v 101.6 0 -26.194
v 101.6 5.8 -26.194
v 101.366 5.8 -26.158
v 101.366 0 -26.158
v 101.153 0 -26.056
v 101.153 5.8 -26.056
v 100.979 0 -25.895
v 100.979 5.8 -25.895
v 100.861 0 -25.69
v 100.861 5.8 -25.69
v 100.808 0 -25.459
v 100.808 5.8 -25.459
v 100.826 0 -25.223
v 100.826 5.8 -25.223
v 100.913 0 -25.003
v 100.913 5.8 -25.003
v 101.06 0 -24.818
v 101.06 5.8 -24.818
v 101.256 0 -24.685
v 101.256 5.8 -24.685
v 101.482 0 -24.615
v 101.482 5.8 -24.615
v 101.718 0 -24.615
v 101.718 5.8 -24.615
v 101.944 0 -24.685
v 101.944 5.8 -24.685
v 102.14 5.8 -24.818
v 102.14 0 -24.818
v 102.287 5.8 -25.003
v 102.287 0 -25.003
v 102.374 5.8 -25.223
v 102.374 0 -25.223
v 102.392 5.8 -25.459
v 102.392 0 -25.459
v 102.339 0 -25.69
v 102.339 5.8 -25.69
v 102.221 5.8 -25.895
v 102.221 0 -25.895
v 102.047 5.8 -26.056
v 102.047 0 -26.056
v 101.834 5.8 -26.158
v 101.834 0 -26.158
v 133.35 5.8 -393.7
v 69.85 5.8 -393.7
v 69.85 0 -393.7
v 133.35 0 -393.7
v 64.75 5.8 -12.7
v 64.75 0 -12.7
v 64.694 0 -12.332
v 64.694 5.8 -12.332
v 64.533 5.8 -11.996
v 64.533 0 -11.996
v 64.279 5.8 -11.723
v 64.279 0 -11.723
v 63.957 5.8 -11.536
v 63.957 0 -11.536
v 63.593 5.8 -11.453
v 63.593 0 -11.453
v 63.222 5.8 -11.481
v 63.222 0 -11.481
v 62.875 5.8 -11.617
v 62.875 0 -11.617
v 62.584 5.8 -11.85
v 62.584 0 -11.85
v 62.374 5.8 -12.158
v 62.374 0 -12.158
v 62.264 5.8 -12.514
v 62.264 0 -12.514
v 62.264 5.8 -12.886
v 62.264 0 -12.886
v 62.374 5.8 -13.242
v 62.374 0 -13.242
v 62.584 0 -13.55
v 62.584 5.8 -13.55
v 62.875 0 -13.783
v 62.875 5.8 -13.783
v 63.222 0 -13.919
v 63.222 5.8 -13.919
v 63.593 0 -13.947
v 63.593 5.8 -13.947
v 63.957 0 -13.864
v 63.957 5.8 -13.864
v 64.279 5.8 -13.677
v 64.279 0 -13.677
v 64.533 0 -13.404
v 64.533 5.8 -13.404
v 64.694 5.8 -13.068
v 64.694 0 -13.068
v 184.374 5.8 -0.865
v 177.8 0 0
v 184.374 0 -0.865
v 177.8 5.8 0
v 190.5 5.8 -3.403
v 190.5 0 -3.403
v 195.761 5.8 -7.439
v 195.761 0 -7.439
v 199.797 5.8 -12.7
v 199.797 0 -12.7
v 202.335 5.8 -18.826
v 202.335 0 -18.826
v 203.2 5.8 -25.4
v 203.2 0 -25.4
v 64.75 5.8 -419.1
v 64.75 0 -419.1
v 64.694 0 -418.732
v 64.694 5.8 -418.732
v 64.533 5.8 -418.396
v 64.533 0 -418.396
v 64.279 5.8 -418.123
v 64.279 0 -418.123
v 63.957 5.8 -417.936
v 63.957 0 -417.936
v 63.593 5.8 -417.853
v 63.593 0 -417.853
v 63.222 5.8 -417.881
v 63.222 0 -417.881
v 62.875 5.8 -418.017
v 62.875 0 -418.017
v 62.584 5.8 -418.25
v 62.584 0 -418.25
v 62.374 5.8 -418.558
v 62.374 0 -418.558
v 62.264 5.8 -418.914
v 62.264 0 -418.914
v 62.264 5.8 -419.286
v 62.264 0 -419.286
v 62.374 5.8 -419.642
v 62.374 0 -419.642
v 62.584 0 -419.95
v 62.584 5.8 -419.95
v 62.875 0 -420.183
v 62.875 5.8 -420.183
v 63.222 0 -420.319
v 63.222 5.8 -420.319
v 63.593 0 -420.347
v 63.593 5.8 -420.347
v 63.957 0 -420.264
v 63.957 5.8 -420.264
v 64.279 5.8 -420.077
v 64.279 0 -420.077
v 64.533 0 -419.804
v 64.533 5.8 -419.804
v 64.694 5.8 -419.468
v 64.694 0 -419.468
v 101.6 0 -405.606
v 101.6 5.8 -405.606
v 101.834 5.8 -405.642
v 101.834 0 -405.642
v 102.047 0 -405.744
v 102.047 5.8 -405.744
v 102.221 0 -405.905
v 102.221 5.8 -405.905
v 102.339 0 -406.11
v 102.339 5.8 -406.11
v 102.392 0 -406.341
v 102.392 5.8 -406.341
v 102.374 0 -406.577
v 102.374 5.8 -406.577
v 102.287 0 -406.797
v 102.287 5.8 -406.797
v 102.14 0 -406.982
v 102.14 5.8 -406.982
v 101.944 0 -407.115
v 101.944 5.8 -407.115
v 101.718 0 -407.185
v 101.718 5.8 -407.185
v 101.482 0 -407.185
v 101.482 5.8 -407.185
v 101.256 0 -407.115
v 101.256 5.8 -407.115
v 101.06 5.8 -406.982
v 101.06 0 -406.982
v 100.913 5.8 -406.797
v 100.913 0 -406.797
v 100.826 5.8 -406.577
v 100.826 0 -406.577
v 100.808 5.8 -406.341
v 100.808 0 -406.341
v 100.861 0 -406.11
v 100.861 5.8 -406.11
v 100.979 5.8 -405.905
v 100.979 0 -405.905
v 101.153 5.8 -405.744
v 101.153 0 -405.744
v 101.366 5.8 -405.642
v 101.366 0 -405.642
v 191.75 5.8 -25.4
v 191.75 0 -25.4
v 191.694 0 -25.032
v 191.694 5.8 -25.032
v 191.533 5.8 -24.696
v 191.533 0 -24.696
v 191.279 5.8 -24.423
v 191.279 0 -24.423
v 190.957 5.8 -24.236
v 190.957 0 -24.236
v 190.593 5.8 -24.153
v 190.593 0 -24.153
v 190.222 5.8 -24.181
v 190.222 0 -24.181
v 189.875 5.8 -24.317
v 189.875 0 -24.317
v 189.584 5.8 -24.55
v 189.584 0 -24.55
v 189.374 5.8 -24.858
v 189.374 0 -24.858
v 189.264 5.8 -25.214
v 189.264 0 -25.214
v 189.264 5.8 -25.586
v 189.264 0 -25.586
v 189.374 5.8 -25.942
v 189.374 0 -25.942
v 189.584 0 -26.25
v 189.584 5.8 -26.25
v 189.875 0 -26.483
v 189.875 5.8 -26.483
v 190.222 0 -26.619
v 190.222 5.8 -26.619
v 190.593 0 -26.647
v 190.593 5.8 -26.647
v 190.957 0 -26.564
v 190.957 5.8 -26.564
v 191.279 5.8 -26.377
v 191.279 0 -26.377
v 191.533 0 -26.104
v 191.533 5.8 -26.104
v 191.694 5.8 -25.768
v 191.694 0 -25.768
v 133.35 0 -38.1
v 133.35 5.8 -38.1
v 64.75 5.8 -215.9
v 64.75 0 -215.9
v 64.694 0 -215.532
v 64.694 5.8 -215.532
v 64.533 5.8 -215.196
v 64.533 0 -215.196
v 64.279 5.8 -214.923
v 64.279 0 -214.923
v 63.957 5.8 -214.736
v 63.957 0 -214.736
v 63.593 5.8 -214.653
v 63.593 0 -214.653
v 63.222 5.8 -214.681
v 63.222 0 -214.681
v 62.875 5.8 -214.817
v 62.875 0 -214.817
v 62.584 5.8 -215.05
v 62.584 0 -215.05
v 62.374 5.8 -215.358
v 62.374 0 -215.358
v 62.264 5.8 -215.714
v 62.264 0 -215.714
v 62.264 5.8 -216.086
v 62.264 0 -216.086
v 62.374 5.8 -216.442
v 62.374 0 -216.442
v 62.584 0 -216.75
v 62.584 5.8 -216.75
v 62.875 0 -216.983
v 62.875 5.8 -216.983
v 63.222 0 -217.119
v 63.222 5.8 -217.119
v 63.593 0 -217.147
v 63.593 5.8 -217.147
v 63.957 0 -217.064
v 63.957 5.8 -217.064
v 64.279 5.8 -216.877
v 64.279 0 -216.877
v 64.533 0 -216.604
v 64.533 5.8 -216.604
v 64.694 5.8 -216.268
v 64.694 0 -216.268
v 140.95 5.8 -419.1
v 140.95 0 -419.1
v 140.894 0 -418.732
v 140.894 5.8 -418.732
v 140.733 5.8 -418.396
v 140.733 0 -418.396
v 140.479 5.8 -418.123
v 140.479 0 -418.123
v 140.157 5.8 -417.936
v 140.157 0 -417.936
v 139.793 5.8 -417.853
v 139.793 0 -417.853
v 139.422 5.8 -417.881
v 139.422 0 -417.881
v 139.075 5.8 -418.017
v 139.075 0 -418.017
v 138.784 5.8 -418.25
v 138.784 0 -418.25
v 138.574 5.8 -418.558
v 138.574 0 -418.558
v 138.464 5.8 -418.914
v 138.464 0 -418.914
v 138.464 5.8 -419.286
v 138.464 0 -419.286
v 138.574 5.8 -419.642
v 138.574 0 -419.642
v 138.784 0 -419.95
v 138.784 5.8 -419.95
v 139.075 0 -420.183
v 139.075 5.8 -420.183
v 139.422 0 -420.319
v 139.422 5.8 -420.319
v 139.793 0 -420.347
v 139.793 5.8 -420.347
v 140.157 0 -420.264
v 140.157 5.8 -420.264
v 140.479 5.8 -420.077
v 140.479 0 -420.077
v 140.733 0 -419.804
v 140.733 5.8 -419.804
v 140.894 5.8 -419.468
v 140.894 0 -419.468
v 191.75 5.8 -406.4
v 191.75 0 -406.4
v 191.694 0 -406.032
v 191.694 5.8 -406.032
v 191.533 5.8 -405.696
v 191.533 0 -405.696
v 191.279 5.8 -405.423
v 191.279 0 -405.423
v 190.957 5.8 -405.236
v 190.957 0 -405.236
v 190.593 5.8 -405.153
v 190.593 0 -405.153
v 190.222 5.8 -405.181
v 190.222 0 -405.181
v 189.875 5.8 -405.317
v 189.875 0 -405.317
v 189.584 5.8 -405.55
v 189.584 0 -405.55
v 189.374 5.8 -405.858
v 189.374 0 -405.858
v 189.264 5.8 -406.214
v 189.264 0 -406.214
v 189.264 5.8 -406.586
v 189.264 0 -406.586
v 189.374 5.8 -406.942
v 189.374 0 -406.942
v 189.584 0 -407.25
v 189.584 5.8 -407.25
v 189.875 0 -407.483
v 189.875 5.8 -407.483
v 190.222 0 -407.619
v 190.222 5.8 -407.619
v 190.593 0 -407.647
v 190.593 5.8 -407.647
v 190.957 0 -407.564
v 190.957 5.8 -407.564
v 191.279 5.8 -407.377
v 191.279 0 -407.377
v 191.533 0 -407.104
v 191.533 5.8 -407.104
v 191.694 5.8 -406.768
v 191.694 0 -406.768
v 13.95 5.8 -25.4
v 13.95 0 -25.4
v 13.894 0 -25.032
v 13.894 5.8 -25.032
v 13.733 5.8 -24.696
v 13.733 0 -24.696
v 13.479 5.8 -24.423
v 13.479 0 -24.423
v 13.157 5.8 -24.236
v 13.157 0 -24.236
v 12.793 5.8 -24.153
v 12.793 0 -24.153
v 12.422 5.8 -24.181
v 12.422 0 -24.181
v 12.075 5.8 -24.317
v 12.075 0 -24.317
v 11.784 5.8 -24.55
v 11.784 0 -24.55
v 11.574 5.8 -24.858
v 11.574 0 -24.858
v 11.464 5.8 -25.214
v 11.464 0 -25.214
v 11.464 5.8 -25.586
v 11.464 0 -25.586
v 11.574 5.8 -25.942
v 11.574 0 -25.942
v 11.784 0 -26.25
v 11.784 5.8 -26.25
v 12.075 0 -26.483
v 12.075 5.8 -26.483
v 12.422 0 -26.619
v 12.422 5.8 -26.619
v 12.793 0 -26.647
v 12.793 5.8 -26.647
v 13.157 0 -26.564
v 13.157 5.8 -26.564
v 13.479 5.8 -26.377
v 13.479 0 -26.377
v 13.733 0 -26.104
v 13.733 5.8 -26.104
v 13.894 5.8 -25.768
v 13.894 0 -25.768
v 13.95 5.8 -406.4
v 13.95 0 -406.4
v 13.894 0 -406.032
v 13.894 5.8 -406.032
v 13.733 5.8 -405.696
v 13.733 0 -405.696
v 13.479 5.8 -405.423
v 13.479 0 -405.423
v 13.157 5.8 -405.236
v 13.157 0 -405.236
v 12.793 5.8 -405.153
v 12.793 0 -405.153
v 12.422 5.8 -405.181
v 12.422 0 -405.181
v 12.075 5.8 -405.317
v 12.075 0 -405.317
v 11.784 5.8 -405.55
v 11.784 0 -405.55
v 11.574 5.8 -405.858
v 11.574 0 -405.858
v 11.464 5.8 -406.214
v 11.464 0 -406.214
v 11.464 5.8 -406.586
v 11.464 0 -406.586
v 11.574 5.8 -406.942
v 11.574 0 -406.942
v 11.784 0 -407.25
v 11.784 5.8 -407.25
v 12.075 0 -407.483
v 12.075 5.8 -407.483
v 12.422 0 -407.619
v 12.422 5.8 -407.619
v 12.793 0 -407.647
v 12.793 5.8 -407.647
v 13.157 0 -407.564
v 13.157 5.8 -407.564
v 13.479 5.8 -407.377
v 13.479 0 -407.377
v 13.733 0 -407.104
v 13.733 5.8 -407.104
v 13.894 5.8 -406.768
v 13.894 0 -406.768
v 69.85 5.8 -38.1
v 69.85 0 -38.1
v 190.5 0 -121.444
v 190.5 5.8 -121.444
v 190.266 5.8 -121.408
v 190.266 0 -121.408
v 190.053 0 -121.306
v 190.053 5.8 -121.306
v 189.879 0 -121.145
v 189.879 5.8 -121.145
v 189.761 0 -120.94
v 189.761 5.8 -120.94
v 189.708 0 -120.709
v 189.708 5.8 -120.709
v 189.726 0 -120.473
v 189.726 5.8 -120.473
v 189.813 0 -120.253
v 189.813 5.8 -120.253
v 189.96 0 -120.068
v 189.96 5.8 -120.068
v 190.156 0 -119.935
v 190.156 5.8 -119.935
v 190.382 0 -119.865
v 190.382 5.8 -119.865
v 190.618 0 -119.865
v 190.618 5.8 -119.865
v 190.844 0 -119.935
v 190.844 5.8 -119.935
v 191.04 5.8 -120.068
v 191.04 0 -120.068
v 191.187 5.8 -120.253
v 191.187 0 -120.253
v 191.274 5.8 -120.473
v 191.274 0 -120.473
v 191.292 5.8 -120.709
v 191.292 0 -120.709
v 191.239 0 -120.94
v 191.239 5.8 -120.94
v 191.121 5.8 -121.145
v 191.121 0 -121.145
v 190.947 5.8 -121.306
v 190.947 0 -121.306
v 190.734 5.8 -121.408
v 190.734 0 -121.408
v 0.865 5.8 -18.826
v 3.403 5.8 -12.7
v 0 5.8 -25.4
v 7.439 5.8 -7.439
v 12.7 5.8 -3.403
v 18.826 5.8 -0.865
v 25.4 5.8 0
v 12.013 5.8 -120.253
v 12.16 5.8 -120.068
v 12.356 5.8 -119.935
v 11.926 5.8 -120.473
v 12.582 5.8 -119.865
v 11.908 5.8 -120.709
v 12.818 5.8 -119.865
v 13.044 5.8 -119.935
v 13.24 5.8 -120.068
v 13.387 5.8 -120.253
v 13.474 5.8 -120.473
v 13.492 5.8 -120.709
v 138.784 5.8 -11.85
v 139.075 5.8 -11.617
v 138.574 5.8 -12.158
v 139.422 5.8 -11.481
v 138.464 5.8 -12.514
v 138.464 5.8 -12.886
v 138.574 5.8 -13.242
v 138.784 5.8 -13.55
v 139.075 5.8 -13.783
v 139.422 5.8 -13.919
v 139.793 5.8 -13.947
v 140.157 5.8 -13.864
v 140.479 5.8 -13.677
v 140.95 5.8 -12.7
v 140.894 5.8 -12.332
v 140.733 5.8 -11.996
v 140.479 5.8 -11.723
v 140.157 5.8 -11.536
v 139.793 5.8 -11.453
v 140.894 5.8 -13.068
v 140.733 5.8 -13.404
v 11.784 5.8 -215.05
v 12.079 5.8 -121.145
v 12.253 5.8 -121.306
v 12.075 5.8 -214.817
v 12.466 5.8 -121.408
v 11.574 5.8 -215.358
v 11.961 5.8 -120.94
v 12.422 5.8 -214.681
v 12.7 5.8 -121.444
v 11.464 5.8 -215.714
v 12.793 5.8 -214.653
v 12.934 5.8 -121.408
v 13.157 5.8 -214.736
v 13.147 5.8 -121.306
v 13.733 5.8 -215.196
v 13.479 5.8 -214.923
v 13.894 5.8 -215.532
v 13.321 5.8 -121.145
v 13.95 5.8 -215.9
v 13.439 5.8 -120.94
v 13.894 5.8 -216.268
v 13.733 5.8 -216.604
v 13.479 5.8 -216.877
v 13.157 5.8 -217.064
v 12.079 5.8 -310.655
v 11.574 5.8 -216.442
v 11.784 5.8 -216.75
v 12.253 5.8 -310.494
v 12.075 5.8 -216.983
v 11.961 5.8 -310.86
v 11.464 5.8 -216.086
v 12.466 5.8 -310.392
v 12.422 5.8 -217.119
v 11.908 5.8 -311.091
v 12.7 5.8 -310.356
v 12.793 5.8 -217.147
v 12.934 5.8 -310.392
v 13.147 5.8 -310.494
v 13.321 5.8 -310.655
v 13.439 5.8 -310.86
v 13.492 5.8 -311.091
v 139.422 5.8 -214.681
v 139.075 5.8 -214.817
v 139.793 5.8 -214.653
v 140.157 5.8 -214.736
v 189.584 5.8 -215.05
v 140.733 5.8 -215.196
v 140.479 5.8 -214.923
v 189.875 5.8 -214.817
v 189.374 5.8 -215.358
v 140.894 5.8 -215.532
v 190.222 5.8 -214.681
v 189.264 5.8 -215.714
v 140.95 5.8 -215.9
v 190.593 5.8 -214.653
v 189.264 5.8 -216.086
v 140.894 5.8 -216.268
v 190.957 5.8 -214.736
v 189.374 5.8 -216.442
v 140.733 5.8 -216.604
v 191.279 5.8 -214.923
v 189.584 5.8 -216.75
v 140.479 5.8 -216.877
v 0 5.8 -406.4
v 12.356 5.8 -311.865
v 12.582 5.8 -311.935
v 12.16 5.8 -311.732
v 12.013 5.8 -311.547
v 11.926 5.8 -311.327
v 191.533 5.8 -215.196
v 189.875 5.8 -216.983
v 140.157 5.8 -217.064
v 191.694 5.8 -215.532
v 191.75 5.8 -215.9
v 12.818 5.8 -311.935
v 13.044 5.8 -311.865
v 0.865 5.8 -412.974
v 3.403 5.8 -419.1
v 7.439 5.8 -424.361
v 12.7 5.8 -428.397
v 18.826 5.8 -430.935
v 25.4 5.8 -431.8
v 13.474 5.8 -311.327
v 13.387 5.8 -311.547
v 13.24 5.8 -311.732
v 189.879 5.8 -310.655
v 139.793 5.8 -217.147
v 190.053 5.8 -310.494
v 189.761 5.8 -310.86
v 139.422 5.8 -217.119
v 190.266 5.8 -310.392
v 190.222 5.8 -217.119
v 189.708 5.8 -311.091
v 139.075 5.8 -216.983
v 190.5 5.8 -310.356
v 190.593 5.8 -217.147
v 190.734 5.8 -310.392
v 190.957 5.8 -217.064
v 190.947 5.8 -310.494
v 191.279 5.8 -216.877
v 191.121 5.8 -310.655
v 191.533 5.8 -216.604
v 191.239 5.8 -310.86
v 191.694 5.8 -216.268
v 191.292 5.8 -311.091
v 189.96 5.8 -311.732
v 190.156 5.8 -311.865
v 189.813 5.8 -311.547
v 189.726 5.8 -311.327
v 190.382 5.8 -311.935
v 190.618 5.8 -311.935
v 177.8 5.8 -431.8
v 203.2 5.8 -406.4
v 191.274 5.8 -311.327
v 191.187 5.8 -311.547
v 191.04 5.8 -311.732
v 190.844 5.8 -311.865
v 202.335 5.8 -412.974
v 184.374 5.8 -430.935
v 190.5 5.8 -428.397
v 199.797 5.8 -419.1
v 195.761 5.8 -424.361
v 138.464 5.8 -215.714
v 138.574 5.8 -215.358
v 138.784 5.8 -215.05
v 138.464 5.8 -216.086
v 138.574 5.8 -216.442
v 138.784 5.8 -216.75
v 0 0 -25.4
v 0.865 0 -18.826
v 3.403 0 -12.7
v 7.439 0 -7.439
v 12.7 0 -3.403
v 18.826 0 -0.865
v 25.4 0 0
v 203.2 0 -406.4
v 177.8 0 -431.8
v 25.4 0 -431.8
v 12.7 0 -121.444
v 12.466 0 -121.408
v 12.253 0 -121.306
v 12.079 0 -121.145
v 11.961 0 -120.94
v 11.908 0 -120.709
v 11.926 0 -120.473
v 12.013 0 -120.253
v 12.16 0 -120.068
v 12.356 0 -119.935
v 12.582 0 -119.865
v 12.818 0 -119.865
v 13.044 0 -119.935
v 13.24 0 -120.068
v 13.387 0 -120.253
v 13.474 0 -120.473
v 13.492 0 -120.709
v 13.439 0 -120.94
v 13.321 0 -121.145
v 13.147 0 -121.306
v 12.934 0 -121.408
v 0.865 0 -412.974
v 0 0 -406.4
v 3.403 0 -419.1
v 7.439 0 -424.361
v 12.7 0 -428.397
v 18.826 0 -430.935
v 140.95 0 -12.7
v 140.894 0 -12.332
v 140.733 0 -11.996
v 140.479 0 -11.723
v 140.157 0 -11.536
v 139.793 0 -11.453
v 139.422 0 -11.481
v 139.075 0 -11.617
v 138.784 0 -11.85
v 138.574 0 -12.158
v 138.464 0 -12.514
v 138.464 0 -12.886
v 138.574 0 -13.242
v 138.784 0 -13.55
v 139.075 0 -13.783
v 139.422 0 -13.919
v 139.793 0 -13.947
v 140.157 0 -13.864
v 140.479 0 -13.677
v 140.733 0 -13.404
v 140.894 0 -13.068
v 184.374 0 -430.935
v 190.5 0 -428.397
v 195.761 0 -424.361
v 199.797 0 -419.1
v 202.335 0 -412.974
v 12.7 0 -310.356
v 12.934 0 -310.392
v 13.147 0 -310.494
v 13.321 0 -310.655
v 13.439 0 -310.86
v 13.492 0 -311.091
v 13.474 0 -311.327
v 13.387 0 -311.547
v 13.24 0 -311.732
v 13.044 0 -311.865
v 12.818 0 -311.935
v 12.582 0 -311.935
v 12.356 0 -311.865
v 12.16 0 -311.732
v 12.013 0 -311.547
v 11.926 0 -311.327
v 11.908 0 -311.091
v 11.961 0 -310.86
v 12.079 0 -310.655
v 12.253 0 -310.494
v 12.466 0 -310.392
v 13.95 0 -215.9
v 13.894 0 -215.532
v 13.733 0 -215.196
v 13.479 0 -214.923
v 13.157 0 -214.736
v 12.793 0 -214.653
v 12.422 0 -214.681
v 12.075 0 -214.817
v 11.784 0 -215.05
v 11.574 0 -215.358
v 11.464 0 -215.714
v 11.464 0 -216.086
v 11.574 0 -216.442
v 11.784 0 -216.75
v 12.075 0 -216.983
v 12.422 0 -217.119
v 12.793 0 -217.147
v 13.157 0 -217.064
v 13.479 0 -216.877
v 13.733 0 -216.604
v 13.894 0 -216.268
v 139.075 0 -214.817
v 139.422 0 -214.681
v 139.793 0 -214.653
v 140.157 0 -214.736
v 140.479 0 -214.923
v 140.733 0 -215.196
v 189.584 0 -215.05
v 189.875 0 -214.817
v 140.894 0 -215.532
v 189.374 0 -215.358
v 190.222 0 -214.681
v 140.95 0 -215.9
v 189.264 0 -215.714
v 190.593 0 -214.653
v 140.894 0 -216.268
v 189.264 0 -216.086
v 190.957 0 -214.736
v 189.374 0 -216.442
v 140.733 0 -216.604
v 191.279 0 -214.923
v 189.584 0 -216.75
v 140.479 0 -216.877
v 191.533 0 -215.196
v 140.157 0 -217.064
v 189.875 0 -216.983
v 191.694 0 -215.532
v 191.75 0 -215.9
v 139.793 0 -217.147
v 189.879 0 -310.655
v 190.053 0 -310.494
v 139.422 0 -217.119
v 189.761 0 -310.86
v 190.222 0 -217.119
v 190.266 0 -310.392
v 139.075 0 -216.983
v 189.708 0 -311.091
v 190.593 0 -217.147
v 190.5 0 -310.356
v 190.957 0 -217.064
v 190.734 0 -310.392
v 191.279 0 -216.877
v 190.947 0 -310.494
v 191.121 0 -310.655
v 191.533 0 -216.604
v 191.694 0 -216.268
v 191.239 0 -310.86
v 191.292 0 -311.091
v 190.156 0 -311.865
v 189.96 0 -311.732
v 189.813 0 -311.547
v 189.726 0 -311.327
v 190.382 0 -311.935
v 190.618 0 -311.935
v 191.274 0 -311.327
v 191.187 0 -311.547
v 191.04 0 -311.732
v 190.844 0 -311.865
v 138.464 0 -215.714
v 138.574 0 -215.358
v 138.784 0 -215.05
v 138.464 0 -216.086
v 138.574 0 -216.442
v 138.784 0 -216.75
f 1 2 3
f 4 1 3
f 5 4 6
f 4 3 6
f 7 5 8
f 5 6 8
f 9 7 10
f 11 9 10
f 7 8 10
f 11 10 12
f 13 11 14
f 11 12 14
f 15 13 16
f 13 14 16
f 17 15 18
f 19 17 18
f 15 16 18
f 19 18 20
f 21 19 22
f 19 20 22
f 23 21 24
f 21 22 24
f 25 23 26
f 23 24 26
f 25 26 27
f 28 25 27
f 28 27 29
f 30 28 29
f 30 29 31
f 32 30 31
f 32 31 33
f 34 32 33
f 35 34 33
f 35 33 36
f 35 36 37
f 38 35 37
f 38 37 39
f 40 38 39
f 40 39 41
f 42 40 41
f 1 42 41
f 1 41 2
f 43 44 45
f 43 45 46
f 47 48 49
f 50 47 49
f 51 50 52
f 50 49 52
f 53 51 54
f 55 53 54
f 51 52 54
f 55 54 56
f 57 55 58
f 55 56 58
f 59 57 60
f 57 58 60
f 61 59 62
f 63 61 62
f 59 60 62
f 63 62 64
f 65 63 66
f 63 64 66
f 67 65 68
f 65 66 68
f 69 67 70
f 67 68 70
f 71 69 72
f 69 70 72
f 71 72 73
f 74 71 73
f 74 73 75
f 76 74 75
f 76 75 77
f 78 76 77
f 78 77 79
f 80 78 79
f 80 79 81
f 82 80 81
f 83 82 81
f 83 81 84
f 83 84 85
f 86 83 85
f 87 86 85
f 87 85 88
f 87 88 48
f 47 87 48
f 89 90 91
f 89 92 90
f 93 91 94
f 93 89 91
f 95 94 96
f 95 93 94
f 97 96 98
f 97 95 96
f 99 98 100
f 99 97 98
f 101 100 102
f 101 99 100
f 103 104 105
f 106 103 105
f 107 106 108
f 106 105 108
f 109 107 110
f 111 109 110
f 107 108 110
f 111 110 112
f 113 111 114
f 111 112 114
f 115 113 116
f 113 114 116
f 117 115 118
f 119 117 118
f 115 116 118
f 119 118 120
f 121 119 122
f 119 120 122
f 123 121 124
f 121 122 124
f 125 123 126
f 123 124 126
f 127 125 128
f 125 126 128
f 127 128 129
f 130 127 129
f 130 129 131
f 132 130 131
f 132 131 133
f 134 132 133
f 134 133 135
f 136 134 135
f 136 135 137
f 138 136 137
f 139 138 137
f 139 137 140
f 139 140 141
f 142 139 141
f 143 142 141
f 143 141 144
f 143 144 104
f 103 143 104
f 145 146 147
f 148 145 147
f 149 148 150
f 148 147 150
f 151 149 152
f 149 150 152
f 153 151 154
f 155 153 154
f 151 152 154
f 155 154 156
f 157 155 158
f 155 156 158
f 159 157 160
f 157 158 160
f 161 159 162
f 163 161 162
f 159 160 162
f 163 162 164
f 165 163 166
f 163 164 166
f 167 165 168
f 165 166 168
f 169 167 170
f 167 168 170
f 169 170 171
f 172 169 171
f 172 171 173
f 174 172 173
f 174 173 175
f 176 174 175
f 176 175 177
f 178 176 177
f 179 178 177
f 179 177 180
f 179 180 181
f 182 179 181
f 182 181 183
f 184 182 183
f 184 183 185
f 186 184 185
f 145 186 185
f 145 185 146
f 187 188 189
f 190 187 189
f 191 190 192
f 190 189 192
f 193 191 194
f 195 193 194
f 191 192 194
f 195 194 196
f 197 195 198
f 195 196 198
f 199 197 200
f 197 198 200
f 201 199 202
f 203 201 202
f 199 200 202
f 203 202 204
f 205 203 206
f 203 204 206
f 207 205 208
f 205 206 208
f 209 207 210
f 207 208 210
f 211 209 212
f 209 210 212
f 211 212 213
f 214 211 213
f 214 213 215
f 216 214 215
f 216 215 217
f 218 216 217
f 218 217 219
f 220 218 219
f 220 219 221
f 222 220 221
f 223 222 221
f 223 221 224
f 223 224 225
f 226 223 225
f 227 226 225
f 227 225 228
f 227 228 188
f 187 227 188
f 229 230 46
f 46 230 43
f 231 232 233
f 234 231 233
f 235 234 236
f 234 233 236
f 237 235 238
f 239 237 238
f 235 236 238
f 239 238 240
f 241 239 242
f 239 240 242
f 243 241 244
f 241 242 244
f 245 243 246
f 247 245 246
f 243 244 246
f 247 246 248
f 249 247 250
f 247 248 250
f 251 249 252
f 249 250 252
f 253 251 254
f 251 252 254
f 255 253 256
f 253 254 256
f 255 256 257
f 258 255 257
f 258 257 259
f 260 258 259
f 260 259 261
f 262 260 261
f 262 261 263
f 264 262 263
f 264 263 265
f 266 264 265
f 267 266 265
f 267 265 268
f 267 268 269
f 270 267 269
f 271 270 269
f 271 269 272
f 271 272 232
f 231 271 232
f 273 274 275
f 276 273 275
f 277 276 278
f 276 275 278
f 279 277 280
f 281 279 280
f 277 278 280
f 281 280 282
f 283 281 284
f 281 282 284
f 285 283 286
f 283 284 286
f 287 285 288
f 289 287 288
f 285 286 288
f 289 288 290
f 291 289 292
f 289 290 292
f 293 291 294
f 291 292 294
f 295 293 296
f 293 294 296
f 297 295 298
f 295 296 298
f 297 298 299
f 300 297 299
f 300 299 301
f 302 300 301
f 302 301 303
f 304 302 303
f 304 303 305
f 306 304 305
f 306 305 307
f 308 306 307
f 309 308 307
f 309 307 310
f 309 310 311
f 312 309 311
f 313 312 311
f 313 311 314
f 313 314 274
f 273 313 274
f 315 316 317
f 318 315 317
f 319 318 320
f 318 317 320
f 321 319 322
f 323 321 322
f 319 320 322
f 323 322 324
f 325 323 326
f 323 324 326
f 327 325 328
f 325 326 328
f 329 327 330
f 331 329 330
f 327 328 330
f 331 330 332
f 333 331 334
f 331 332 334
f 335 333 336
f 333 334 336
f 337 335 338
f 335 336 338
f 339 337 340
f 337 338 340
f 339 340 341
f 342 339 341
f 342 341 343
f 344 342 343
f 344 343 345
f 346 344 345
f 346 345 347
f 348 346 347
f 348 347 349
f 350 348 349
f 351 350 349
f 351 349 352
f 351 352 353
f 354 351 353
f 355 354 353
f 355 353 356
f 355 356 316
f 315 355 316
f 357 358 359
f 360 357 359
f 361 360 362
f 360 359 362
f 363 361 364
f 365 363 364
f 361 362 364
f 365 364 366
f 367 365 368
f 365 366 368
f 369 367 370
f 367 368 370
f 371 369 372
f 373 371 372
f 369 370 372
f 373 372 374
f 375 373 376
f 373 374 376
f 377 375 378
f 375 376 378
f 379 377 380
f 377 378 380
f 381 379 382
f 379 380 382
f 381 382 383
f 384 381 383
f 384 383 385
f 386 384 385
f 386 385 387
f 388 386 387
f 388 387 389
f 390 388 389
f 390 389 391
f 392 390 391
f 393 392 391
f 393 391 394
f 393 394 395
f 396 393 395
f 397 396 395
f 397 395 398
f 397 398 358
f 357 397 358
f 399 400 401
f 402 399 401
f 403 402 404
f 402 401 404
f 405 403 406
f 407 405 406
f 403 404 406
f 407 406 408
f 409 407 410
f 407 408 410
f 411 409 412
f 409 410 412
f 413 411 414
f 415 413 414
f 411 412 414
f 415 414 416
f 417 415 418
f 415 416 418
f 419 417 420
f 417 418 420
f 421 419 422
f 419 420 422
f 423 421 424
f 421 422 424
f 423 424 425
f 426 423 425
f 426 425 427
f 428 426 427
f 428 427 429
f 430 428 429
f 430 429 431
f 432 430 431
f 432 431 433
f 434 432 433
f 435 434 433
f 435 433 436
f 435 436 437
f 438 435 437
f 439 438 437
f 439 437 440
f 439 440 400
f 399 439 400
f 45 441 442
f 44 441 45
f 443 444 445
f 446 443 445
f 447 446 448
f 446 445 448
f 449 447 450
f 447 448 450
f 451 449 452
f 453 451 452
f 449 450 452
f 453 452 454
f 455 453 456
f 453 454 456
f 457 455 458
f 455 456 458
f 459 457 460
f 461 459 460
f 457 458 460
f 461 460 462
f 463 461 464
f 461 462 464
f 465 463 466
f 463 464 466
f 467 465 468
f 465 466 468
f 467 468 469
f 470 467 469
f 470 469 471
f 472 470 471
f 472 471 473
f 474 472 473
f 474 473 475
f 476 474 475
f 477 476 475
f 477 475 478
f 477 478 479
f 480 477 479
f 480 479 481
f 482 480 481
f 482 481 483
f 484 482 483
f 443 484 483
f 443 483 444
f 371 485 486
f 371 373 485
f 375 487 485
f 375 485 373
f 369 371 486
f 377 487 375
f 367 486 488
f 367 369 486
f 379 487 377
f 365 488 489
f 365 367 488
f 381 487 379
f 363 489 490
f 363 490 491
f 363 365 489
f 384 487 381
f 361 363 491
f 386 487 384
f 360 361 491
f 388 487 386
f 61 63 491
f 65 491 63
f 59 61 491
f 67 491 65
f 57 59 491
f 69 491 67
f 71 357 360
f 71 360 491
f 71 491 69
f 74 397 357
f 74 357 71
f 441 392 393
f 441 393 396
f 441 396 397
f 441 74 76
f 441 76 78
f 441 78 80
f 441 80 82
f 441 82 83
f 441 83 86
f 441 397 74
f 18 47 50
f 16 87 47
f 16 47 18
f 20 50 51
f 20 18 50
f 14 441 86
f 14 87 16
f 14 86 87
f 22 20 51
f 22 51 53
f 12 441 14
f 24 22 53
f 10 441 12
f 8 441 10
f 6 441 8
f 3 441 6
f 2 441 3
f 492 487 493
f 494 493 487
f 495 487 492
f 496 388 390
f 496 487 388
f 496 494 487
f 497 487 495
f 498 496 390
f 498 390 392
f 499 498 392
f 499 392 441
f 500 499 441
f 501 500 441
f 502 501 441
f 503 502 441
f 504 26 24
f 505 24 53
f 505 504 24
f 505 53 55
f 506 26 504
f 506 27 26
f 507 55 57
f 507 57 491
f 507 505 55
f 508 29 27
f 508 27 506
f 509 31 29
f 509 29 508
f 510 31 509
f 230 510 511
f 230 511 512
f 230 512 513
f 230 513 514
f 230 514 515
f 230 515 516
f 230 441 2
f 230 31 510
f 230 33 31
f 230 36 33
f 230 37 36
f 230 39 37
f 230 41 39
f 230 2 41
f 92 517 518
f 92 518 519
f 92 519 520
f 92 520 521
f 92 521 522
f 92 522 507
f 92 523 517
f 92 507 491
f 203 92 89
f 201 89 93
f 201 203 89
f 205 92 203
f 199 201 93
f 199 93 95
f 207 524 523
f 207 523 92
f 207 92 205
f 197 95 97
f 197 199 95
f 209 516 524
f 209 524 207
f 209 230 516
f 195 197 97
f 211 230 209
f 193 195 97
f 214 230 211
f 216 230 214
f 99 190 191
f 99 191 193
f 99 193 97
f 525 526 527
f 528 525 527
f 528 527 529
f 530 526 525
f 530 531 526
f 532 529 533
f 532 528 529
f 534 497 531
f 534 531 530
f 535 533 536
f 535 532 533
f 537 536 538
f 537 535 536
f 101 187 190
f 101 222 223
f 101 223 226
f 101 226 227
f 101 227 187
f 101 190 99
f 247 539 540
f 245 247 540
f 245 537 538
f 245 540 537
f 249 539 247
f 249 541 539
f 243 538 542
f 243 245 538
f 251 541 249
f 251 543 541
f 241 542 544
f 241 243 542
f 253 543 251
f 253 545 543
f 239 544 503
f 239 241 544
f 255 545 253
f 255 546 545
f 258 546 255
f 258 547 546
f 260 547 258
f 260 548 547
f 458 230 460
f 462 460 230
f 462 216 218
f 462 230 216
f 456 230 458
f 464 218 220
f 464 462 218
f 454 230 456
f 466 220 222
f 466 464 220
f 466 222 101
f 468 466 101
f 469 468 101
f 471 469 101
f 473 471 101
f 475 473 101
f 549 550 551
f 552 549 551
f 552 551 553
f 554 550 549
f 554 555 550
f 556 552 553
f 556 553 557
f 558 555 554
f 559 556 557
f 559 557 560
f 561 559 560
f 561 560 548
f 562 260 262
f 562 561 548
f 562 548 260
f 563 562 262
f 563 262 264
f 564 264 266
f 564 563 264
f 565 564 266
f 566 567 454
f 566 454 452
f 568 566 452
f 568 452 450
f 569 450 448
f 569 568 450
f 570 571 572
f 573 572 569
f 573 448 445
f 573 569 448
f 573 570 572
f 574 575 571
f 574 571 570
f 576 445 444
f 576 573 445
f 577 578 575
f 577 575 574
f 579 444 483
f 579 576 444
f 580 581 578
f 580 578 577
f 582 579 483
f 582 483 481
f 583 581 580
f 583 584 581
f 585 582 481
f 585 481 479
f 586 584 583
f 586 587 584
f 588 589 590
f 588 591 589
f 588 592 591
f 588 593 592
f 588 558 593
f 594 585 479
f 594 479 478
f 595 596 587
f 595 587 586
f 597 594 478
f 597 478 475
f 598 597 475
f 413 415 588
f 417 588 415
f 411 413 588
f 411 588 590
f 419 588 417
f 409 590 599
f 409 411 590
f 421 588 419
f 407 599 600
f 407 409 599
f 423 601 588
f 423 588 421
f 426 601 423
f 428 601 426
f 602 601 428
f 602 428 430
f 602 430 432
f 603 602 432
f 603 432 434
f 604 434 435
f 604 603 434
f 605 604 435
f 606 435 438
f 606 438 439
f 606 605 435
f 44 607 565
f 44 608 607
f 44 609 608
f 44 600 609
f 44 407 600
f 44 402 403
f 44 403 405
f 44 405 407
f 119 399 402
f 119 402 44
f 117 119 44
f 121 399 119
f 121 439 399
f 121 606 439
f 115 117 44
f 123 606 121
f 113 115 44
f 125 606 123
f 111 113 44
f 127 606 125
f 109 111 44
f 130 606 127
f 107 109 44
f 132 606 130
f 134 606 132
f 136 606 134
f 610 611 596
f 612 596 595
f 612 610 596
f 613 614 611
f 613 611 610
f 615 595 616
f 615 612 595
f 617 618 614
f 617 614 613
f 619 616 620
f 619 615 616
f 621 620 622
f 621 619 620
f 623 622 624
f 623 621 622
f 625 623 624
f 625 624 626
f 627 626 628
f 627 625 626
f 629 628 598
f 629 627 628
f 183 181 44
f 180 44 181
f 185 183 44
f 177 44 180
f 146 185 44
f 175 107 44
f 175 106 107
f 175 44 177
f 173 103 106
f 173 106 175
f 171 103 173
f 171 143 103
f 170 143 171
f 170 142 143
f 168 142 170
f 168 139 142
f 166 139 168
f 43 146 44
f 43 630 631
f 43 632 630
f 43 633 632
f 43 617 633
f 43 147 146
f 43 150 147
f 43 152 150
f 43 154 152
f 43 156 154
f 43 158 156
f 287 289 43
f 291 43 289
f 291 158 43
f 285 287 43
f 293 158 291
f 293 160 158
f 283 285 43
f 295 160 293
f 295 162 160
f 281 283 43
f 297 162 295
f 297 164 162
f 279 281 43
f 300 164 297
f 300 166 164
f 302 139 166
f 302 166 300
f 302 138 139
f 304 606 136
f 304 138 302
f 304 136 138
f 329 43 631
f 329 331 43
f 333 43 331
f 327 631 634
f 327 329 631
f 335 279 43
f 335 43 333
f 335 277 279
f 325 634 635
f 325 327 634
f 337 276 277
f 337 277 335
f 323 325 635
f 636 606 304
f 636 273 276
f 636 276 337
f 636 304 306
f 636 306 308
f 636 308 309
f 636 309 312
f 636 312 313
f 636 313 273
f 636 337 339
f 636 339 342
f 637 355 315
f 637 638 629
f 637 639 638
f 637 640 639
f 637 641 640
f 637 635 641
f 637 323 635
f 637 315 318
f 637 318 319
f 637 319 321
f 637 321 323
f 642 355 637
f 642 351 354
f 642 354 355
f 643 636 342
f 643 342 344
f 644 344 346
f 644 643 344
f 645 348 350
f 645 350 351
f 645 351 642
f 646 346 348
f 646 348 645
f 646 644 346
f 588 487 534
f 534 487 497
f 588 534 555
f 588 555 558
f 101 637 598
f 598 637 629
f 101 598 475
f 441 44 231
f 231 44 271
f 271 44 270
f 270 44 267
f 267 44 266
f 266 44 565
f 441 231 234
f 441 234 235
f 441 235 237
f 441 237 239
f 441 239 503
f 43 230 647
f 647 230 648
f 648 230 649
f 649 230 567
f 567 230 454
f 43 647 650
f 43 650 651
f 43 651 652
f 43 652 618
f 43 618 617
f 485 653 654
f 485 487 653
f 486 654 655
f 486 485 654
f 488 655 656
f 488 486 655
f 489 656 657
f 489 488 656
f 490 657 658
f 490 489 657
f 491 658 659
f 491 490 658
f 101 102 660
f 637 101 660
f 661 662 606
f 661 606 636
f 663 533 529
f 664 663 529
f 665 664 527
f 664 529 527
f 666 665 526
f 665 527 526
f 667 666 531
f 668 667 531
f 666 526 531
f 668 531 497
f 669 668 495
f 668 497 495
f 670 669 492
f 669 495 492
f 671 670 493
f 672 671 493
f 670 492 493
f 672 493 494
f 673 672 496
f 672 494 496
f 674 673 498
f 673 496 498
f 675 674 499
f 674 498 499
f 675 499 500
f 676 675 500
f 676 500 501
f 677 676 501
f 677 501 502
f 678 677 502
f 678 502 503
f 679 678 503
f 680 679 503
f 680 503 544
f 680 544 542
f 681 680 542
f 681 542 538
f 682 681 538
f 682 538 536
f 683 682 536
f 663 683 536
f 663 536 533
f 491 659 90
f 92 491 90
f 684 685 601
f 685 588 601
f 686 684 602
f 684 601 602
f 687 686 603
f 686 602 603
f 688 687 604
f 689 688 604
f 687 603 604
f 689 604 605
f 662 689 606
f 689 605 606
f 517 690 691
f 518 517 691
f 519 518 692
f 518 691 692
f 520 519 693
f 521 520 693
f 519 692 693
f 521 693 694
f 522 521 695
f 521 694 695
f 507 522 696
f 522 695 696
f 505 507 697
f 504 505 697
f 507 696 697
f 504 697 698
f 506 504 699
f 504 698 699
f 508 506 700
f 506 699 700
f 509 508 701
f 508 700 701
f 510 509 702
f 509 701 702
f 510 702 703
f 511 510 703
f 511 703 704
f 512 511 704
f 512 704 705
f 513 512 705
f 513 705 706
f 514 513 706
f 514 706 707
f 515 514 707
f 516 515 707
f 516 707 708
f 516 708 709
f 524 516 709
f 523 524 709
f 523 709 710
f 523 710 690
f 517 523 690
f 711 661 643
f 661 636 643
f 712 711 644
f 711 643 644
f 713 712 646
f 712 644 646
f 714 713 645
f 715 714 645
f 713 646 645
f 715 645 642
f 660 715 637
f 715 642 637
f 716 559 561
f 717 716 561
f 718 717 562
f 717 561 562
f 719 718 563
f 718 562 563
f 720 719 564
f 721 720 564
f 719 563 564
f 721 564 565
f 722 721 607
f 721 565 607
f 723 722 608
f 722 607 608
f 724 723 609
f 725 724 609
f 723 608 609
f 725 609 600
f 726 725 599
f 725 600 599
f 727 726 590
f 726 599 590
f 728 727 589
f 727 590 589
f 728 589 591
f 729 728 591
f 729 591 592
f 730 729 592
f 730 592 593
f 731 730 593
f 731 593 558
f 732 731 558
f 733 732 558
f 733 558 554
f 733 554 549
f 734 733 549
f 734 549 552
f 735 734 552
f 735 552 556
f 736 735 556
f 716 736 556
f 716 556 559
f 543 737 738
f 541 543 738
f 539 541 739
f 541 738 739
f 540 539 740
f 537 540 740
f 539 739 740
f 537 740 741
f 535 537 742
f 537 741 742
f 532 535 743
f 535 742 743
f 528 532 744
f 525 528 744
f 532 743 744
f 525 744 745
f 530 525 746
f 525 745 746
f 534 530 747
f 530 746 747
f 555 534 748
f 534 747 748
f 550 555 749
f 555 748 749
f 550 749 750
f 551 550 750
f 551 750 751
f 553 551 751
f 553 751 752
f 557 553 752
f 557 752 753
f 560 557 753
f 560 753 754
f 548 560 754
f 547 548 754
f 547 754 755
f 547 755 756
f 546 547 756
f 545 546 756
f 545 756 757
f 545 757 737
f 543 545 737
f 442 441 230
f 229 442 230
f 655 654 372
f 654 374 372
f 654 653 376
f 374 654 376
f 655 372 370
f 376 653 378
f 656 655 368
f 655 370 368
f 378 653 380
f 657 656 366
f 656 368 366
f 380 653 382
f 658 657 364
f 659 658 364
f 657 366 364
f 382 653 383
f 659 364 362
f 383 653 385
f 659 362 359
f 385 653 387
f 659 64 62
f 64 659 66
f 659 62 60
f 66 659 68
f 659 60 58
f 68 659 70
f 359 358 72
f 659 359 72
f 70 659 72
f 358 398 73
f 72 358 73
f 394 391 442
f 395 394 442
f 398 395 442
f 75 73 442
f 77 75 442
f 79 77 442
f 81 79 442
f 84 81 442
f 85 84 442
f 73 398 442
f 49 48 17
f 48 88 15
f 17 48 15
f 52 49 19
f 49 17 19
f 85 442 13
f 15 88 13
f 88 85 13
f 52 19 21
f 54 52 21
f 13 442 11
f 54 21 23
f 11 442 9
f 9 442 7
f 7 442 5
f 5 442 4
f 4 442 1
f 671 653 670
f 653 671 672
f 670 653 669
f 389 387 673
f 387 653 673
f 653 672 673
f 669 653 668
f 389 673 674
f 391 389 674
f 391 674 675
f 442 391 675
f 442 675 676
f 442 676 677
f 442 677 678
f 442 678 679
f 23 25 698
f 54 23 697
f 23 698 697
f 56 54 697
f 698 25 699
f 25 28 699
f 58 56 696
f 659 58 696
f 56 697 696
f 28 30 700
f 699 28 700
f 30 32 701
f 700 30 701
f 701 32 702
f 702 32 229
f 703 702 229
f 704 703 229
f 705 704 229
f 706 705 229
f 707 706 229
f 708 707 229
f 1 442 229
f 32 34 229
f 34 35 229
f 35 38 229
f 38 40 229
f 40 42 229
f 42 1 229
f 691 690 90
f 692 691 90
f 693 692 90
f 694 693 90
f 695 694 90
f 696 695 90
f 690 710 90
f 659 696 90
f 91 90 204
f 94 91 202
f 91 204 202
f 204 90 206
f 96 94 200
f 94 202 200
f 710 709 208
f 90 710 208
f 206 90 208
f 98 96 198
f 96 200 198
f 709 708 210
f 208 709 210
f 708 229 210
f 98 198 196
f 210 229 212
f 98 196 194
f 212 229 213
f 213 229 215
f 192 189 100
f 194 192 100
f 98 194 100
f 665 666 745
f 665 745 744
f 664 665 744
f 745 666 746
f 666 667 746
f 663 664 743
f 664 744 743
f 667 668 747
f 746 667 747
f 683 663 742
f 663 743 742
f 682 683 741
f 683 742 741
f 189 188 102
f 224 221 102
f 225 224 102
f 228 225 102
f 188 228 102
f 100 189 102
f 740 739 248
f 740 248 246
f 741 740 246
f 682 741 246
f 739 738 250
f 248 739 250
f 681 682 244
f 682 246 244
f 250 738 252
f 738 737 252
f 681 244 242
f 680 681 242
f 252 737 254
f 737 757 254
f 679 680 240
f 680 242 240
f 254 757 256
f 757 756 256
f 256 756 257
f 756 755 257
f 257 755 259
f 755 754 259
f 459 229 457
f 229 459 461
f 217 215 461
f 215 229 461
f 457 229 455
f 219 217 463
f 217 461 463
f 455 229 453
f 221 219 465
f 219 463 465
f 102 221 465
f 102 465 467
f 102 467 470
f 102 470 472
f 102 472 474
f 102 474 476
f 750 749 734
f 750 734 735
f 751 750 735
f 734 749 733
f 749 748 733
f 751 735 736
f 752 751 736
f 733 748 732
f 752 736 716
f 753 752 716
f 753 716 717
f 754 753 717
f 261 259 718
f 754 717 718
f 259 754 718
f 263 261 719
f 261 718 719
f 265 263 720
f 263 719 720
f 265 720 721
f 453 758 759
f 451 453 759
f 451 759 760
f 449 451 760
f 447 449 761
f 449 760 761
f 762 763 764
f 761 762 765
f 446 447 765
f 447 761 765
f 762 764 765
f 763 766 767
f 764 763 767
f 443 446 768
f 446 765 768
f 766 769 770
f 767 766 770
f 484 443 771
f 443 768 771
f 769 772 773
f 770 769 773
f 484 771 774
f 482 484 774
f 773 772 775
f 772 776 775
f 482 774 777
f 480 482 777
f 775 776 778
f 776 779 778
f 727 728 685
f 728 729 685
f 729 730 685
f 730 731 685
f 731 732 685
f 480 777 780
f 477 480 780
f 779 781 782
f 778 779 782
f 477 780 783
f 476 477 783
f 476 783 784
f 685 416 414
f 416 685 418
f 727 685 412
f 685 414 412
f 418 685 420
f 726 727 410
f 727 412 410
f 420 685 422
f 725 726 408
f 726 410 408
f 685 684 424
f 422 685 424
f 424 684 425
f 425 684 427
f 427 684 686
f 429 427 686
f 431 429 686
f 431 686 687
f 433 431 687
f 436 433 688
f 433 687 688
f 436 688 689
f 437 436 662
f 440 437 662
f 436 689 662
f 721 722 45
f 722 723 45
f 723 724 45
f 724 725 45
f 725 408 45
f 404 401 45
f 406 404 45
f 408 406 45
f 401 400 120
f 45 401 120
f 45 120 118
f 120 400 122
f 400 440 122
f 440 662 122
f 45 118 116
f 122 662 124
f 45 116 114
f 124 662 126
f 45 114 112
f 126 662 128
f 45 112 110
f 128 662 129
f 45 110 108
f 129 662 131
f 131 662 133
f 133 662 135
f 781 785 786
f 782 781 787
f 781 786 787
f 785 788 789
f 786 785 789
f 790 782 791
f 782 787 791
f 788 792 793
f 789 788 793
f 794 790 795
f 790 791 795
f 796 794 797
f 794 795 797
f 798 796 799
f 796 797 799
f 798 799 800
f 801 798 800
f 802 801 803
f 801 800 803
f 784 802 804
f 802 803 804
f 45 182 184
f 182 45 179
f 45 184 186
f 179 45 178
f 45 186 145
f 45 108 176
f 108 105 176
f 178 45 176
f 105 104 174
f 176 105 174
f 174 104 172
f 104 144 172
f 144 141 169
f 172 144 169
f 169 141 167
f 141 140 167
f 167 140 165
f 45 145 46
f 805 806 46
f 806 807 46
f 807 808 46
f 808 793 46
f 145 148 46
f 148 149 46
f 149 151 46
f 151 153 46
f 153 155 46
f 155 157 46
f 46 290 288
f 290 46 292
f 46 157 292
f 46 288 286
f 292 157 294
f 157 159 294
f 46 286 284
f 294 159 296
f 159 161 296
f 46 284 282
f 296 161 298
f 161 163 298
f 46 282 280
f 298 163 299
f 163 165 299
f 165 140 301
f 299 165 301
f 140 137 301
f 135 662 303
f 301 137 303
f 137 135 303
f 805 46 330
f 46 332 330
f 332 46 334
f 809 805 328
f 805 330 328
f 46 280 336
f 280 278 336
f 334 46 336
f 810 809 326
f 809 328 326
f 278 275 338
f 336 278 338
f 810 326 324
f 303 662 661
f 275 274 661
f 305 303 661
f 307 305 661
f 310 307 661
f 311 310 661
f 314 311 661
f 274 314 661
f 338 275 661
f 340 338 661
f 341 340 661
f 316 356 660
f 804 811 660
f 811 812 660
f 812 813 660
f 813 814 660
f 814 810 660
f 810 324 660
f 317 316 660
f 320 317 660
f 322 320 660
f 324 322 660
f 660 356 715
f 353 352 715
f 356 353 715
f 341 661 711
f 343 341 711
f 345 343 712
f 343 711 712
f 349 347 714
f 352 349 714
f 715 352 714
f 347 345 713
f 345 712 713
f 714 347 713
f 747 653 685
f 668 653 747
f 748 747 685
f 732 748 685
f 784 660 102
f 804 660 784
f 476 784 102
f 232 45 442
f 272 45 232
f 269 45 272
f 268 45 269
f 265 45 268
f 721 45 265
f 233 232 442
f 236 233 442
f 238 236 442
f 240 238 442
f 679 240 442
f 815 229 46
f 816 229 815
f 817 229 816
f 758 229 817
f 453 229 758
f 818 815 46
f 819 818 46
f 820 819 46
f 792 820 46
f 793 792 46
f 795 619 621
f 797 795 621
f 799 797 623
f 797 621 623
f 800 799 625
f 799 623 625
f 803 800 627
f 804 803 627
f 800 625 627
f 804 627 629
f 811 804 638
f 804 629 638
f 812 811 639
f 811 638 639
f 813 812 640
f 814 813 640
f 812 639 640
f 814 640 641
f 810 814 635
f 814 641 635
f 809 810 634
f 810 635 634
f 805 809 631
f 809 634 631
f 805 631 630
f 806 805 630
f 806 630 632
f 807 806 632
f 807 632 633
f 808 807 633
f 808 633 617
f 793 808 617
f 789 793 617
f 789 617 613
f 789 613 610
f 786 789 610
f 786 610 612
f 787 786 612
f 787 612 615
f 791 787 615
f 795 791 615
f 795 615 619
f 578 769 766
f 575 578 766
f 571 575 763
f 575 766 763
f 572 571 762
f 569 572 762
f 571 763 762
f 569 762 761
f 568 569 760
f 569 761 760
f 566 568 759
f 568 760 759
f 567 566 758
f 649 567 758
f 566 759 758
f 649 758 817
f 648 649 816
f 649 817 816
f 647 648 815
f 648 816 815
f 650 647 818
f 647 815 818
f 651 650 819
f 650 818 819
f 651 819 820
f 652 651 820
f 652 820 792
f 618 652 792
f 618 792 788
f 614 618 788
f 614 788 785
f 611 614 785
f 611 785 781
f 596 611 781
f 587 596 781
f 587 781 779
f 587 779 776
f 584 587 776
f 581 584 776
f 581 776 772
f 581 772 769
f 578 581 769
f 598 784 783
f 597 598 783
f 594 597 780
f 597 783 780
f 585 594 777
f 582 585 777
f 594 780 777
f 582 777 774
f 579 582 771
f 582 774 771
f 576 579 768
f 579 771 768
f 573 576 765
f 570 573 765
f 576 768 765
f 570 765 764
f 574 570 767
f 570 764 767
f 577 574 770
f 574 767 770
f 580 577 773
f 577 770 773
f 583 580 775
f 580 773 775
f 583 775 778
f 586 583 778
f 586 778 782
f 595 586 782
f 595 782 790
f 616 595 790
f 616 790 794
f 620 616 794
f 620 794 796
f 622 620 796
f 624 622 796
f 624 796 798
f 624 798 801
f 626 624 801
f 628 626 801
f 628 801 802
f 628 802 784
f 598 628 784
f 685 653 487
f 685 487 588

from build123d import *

# Parameters (mm, degrees)
SKETCH1_W                 = 203.2
SKETCH1_H                 = 431.8
BOSS_EXTRUDE1_DEPTH       = 5.8
M3X0_5_TAPPED_HOLE2_D     = 2.5
M3X0_5_TAPPED_HOLE2_DEPTH = 7.5
M3X0_5_TAPPED_HOLE2_TIP   = 0.751075774
SKETCH7_W                 = 63.5
SKETCH7_H                 = 355.6
CUT_EXTRUDE2_DEPTH        = 478.257917692
FILLET1_R                 = 25.4
M3X0_5_TAPPED_HOLE1_D     = 2.5
M3X0_5_TAPPED_HOLE1_DEPTH = 7.5
M3X0_5_TAPPED_HOLE1_TIP   = 0.751075774
SKETCH10_R                = 0.79375
CUT_EXTRUDE3_DEPTH        = 478.257917692


with BuildPart() as part:
    # Sketch1 → Boss-Extrude1 (new body)
    with BuildSketch(Plane(origin=(0, 0, 0), x_dir=(1, 0, 0), z_dir=(0, 1, 0))):
        with Locations((101.6, 215.9)):
            Rectangle(SKETCH1_W, SKETCH1_H)
    extrude(amount=BOSS_EXTRUDE1_DEPTH)

    # M3x0.5 Tapped Hole2
    with Locations(Plane(origin=(0, 5.8, 0), x_dir=(-1, 0, 0), z_dir=(0, 1, 0))):
        with Locations((-63.5, -419.1), (-139.7, -419.1), (-63.5, -215.9), (-139.7, -215.9), (-63.5, -12.7), (-139.7, -12.7)):
            Hole(M3X0_5_TAPPED_HOLE2_D / 2, depth=M3X0_5_TAPPED_HOLE2_DEPTH)
            with Locations((0, 0, -(M3X0_5_TAPPED_HOLE2_DEPTH + M3X0_5_TAPPED_HOLE2_TIP / 2))):  # 118° drill point
                Cone(0, M3X0_5_TAPPED_HOLE2_D / 2, M3X0_5_TAPPED_HOLE2_TIP, mode=Mode.SUBTRACT)

    # Sketch7 → Cut-Extrude2 (cut, through all)
    with BuildSketch(Plane(origin=(0, 5.8, 0), x_dir=(1, 0, 0), z_dir=(0, 1, 0))):
        with Locations((101.6, 215.9)):
            Rectangle(SKETCH7_W, SKETCH7_H)
    extrude(amount=-CUT_EXTRUDE2_DEPTH, mode=Mode.SUBTRACT)

    # Fillet1
    fillet1_edges = [part.edges().sort_by_distance(p)[0] for p in [
        (0, 2.9, -431.8),
        (203.2, 2.9, -431.8),
        (203.2, 2.9, 0),
        (0, 2.9, 0),
    ]]
    fillet(fillet1_edges, radius=FILLET1_R)

    # M3x0.5 Tapped Hole1
    with Locations(Plane(origin=(0, 5.8, 0), x_dir=(-1, 0, 0), z_dir=(0, 1, 0))):
        with Locations((-190.5, -406.4), (-190.5, -25.4), (-12.7, -25.4), (-12.7, -406.4), (-190.5, -215.9), (-12.7, -215.9)):
            Hole(M3X0_5_TAPPED_HOLE1_D / 2, depth=M3X0_5_TAPPED_HOLE1_DEPTH)
            with Locations((0, 0, -(M3X0_5_TAPPED_HOLE1_DEPTH + M3X0_5_TAPPED_HOLE1_TIP / 2))):  # 118° drill point
                Cone(0, M3X0_5_TAPPED_HOLE1_D / 2, M3X0_5_TAPPED_HOLE1_TIP, mode=Mode.SUBTRACT)

    # Sketch10 → Cut-Extrude3 (cut, through all)
    with BuildSketch(Plane(origin=(0, 5.8, 0), x_dir=(1, 0, 0), z_dir=(0, 1, 0))):
        with Locations(Location((12.7, 311.15, 0), (0, 0, 270))):
            Circle(SKETCH10_R)
        with Locations(Location((190.5, 311.15, 0), (0, 0, 270))):
            Circle(SKETCH10_R)
        with Locations(Location((101.6, 406.4, 0), (0, 0, 270))):
            Circle(SKETCH10_R)
        with Locations(Location((101.6, 25.4, 0), (0, 0, 90))):
            Circle(SKETCH10_R)
        with Locations(Location((190.5, 120.65, 0), (0, 0, 90))):
            Circle(SKETCH10_R)
        with Locations(Location((12.7, 120.65, 0), (0, 0, 90))):
            Circle(SKETCH10_R)
    extrude(amount=-CUT_EXTRUDE3_DEPTH, mode=Mode.SUBTRACT)


solid = part.part
